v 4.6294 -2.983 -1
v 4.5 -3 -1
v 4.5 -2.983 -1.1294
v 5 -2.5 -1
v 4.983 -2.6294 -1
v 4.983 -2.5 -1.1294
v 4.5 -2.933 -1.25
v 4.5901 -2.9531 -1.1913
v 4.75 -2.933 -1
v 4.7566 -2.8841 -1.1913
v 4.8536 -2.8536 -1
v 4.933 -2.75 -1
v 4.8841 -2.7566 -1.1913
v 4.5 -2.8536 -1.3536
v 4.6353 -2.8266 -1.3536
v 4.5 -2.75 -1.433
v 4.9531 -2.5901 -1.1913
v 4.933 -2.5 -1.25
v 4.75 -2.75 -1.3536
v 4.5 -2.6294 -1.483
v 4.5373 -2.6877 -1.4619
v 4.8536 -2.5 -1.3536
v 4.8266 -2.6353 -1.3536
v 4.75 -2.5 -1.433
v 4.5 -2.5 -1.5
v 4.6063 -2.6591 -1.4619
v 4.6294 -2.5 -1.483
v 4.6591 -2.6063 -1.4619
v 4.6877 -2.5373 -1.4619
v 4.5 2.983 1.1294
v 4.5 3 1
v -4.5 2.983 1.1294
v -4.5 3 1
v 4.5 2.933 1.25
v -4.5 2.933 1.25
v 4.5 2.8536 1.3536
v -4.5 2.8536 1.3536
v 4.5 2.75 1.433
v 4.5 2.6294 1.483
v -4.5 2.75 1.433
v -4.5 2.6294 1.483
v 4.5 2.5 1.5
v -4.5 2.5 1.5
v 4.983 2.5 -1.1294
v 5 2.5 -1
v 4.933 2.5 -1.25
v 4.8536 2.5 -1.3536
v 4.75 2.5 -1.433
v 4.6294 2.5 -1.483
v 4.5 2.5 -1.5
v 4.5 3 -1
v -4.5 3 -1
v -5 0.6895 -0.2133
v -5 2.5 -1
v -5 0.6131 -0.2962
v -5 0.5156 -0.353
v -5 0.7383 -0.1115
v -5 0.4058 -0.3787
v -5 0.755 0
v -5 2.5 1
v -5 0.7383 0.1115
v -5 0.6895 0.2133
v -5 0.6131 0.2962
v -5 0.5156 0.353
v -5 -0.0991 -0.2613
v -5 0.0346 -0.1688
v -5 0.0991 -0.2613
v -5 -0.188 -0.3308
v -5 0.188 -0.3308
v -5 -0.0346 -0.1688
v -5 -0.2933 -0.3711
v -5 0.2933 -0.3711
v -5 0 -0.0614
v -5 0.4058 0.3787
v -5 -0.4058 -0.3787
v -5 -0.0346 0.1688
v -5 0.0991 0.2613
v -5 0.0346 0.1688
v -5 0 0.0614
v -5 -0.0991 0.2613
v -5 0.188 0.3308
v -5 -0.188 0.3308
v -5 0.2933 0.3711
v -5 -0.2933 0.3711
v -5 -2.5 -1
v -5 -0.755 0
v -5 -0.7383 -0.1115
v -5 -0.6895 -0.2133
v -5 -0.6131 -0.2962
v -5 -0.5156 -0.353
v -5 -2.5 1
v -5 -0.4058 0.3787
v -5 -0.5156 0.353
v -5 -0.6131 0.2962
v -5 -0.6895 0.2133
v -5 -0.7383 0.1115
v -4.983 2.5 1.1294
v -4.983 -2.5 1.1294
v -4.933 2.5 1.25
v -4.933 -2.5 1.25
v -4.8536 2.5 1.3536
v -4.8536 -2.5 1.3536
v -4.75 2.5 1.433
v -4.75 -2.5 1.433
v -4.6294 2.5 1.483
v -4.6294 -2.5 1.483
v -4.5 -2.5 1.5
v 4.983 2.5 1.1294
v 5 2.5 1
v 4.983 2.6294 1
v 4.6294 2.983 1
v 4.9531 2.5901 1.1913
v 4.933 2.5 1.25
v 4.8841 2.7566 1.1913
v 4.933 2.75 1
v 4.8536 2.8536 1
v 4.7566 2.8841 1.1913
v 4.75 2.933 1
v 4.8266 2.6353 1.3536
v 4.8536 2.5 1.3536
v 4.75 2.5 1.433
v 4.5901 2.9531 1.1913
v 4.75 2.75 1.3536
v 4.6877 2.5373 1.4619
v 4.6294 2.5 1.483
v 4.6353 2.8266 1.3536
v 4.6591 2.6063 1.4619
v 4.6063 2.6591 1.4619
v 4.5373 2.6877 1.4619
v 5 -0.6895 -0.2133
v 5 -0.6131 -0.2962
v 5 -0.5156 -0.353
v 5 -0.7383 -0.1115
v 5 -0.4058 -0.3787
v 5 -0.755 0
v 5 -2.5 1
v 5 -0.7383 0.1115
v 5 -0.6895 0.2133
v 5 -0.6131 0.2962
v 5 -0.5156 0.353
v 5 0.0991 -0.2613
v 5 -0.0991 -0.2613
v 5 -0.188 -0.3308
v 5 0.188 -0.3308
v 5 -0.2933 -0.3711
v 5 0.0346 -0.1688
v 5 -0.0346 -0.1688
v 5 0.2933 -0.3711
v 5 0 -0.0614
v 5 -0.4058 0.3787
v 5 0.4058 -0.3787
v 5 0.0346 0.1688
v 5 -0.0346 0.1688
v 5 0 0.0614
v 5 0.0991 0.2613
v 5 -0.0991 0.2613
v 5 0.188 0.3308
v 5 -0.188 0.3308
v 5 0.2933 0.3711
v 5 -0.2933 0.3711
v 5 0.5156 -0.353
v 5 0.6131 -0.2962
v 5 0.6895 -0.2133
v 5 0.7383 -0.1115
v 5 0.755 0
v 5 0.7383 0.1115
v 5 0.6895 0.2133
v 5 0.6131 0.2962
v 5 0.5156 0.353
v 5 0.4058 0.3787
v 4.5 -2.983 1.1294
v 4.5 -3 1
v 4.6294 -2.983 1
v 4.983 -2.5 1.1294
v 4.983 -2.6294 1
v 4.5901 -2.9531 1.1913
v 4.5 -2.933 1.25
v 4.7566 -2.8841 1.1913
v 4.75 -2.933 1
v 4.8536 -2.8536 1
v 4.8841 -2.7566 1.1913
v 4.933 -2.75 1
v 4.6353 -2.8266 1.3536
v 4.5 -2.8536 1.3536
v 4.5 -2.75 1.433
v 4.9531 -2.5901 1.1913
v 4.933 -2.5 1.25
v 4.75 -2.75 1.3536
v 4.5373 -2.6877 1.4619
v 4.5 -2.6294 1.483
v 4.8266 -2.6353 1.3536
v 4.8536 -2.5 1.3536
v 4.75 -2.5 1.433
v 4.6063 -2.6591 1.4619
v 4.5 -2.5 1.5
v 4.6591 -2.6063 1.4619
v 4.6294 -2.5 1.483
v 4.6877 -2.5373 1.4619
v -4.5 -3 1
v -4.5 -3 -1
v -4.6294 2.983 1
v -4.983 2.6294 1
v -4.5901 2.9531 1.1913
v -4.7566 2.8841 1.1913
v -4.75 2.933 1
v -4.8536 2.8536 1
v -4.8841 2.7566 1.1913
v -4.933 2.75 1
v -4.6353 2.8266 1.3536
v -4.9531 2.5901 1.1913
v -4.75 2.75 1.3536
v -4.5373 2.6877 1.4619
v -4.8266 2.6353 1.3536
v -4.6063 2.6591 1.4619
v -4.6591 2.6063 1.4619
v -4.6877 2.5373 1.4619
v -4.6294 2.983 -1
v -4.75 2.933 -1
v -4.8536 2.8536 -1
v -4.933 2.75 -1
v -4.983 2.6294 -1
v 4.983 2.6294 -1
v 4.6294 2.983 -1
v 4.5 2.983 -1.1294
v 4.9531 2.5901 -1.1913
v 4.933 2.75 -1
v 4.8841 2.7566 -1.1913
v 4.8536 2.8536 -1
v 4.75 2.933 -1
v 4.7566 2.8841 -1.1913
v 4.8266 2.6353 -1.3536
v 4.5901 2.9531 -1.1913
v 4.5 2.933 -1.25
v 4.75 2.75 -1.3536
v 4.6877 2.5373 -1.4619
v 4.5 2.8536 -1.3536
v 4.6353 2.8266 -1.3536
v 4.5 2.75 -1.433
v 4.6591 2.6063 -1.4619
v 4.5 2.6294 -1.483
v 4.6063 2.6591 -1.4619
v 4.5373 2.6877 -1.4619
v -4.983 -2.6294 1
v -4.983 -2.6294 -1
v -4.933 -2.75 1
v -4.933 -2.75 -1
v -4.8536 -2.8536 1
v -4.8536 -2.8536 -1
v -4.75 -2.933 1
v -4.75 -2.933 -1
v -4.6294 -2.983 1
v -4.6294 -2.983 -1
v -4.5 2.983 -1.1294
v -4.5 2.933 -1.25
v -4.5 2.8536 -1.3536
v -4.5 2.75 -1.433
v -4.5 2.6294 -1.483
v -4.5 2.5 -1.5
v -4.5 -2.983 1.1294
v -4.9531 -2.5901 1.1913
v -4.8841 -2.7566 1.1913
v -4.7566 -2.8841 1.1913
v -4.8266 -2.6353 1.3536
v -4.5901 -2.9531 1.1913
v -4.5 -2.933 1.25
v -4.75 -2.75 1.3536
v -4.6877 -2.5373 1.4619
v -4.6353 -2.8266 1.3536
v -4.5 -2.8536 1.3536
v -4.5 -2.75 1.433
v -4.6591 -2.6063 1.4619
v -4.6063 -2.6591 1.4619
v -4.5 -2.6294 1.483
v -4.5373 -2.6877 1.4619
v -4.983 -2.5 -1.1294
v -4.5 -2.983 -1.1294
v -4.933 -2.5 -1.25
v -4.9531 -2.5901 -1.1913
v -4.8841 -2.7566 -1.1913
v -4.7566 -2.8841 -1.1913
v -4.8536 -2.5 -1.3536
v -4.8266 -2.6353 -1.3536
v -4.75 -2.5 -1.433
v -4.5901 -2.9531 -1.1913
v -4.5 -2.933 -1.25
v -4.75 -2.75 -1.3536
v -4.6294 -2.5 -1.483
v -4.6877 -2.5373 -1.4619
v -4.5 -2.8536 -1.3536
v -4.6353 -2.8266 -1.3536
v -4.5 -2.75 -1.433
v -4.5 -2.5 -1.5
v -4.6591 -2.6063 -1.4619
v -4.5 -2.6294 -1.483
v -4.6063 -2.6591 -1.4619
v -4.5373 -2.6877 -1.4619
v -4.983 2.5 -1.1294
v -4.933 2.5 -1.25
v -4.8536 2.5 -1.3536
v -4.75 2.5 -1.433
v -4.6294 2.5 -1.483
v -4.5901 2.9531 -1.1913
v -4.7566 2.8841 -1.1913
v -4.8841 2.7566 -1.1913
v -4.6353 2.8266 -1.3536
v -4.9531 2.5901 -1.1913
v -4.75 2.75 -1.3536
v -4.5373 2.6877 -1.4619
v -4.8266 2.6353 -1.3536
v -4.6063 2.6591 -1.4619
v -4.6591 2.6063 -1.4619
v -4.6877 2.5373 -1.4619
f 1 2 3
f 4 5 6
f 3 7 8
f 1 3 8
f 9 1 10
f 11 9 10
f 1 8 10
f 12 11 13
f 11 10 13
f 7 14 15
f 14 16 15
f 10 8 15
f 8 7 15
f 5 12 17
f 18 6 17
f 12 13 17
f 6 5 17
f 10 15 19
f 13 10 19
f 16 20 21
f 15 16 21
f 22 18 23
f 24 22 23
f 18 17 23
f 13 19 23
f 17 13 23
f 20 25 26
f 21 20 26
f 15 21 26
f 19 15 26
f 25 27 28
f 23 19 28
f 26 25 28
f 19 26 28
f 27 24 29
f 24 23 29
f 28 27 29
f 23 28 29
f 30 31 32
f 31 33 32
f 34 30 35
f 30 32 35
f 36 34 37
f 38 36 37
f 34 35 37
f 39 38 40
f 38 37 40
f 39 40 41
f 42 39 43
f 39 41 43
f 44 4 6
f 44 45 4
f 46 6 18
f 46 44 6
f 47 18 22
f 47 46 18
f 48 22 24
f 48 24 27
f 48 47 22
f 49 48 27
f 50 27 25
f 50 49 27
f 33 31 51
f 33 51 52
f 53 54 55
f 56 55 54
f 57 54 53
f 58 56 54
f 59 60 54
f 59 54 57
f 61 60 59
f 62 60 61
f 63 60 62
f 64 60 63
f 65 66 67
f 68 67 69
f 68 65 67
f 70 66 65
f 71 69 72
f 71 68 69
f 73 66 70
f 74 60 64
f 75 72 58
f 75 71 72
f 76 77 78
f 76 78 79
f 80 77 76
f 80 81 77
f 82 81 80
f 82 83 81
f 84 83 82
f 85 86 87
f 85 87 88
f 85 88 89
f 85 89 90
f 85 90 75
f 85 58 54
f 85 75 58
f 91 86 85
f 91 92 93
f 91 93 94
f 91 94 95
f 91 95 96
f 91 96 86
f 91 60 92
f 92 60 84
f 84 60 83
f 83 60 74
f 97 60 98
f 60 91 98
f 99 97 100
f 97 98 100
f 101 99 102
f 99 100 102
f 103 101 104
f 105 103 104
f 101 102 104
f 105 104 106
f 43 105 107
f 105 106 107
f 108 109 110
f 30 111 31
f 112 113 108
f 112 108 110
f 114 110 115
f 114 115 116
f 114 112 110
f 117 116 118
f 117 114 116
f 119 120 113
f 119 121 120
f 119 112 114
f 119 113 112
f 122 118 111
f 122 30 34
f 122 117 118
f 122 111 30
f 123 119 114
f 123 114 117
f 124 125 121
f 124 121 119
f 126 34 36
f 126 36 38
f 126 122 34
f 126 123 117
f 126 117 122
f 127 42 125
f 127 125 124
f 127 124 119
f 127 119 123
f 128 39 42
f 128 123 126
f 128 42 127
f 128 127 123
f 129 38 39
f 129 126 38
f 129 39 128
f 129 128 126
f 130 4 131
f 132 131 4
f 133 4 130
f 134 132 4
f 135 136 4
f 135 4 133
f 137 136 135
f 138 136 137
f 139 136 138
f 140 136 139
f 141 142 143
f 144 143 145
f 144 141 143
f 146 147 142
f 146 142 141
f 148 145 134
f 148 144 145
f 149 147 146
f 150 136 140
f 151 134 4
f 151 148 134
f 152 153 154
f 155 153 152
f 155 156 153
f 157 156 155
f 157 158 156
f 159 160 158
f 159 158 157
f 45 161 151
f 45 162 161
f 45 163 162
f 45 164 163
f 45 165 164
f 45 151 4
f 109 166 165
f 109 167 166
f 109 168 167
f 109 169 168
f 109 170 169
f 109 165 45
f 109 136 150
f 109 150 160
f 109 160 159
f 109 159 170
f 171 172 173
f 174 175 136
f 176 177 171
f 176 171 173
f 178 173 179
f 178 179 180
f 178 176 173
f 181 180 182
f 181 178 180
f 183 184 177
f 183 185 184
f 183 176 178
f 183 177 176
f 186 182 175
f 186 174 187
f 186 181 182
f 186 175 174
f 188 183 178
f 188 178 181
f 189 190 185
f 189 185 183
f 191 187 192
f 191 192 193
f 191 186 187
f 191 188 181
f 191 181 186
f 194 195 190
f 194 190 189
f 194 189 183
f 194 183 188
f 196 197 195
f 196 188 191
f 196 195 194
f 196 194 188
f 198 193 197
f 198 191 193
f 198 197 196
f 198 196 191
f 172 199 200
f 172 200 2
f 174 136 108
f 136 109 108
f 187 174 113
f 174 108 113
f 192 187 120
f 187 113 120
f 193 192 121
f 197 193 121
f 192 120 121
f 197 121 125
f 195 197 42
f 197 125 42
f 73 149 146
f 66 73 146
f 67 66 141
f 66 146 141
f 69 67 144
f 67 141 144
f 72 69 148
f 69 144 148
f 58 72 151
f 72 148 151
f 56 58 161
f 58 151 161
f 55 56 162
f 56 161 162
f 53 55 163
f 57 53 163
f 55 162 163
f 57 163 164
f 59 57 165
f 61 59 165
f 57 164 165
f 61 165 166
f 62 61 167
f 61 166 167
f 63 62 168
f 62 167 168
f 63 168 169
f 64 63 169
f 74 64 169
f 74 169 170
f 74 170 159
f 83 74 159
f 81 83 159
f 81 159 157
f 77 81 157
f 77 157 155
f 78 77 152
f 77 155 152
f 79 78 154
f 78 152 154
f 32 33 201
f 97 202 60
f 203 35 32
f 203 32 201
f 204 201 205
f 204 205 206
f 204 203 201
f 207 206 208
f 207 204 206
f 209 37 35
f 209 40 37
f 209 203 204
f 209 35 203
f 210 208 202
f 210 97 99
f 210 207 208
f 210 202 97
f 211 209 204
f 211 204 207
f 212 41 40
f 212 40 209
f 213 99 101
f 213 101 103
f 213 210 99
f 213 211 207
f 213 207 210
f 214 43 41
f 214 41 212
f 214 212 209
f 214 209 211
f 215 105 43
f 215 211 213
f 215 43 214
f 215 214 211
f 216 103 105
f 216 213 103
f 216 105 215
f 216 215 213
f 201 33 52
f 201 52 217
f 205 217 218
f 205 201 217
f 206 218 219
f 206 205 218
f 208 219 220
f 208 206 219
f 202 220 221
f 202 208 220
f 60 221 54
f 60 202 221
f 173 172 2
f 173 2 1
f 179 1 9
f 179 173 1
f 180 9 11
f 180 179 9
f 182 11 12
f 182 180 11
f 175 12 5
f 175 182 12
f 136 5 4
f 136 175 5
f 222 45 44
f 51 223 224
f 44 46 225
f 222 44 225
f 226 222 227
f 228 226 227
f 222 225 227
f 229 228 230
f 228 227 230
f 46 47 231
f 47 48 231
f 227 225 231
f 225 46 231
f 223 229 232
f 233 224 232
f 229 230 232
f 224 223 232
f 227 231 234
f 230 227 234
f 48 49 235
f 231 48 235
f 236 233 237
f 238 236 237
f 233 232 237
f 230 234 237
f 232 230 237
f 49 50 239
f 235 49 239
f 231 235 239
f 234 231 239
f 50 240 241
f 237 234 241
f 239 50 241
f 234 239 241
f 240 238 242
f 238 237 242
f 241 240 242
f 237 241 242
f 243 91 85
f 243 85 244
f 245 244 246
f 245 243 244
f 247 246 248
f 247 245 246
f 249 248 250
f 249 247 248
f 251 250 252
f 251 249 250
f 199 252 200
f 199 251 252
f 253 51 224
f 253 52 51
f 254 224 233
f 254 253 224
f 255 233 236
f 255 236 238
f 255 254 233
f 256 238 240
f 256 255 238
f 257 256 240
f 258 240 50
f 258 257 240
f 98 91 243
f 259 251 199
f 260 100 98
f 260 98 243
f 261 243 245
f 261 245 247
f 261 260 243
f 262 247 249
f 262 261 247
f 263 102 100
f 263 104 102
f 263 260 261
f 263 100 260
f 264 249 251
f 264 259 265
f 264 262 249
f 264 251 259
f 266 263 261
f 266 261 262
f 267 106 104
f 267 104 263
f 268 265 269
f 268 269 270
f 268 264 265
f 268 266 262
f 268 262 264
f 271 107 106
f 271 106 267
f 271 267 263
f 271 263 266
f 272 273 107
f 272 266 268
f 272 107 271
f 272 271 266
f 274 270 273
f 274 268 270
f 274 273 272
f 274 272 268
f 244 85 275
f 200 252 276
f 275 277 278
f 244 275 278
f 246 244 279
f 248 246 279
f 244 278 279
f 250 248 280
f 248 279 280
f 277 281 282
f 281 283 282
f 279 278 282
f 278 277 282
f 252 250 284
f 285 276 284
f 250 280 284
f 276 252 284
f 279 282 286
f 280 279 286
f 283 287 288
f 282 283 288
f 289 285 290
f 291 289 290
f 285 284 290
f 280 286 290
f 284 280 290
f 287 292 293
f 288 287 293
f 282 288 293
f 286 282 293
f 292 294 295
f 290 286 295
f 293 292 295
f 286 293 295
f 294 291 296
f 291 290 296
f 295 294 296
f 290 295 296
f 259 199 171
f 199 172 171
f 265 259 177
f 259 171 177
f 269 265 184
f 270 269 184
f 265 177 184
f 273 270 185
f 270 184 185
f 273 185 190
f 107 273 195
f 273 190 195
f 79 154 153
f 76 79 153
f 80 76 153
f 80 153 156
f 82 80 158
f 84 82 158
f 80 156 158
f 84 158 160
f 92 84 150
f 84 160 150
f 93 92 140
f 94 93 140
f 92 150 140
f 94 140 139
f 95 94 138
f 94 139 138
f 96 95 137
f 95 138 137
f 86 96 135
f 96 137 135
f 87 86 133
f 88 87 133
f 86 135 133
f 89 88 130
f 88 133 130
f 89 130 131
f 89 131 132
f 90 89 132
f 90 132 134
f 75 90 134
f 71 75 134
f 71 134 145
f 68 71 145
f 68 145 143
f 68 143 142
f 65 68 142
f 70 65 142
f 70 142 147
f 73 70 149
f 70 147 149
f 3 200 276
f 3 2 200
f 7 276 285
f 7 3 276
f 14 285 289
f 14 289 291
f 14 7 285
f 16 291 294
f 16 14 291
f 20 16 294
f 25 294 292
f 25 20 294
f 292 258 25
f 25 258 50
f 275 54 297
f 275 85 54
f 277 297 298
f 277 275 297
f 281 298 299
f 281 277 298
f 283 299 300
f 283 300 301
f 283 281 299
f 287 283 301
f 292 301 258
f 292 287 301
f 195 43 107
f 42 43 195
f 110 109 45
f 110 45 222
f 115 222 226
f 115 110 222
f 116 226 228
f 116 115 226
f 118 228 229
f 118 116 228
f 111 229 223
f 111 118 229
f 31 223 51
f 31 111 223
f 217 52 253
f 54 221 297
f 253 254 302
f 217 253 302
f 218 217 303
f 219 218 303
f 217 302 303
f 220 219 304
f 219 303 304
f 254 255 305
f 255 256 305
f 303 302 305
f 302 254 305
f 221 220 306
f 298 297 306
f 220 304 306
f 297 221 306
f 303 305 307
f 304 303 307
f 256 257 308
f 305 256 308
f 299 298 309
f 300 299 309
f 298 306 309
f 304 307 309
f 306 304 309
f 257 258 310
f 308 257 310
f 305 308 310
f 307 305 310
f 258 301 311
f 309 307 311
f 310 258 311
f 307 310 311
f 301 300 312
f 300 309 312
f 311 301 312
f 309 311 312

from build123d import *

# Parameters (mm, degrees)
F1_DEPTH = 1.5
F2_R     = 0.5
F4_DEPTH = 15


with BuildPart() as f1:
    # F0 (on Top) → F1 (new body, symmetric)
    with BuildSketch(Plane.XY):
        with BuildLine():
            ThreePointArc((-5, -2.5), (-4.8535533906, -2.8535533906), (-4.5, -3))
            Line((-4.5, -3), (4.5, -3))
            ThreePointArc((4.5, -3), (4.8535533906, -2.8535533906), (5, -2.5))
            Line((5, -2.5), (5, 2.5))
            ThreePointArc((5, 2.5), (4.8535533906, 2.8535533906), (4.5, 3))
            Line((4.5, 3), (-4.5, 3))
            ThreePointArc((-4.5, 3), (-4.8535533906, 2.8535533906), (-5, 2.5))
            Line((-5, 2.5), (-5, -2.5))
        make_face()
    extrude(amount=F1_DEPTH, both=True)

    # F2
    f2_edges = [f1.edges().sort_by_distance(p)[0] for p in [
        (0, 3, 1.5),
        (-5, 0, -1.5),
    ]]
    fillet(f2_edges, radius=F2_R)

    # F3 (on Right) → F4 (cut, symmetric)
    with BuildSketch(Plane.YZ):
        with BuildLine():
            ThreePointArc((0, -0.0614410286), (0.0037479373, -0.03082207), (0.005, 0))
            ThreePointArc((0.005, 0), (0.0037479373, 0.03082207), (0, 0.0614410286))
            ThreePointArc((0, 0.0614410286), (-0.005, 0), (0, -0.0614410286))
        make_face()
        with BuildLine():
            ThreePointArc((0, 0.0614410286), (0.0037479373, 0.03082207), (0.005, 0))
            ThreePointArc((0.005, 0), (0.0037479373, -0.03082207), (0, -0.0614410286))
            ThreePointArc((0, -0.0614410286), (0.40582207, -0.3787479373), (0.755, 0))
            ThreePointArc((0.755, 0), (0.40582207, 0.3787479373), (0, 0.0614410286))
        make_face()
        with BuildLine():
            ThreePointArc((0, -0.0614410286), (-0.005, 0), (0, 0.0614410286))
            ThreePointArc((0, 0.0614410286), (-0.755, 0), (0, -0.0614410286))
        make_face()
    extrude(amount=F4_DEPTH, both=True, mode=Mode.SUBTRACT)


solid = f1.part
